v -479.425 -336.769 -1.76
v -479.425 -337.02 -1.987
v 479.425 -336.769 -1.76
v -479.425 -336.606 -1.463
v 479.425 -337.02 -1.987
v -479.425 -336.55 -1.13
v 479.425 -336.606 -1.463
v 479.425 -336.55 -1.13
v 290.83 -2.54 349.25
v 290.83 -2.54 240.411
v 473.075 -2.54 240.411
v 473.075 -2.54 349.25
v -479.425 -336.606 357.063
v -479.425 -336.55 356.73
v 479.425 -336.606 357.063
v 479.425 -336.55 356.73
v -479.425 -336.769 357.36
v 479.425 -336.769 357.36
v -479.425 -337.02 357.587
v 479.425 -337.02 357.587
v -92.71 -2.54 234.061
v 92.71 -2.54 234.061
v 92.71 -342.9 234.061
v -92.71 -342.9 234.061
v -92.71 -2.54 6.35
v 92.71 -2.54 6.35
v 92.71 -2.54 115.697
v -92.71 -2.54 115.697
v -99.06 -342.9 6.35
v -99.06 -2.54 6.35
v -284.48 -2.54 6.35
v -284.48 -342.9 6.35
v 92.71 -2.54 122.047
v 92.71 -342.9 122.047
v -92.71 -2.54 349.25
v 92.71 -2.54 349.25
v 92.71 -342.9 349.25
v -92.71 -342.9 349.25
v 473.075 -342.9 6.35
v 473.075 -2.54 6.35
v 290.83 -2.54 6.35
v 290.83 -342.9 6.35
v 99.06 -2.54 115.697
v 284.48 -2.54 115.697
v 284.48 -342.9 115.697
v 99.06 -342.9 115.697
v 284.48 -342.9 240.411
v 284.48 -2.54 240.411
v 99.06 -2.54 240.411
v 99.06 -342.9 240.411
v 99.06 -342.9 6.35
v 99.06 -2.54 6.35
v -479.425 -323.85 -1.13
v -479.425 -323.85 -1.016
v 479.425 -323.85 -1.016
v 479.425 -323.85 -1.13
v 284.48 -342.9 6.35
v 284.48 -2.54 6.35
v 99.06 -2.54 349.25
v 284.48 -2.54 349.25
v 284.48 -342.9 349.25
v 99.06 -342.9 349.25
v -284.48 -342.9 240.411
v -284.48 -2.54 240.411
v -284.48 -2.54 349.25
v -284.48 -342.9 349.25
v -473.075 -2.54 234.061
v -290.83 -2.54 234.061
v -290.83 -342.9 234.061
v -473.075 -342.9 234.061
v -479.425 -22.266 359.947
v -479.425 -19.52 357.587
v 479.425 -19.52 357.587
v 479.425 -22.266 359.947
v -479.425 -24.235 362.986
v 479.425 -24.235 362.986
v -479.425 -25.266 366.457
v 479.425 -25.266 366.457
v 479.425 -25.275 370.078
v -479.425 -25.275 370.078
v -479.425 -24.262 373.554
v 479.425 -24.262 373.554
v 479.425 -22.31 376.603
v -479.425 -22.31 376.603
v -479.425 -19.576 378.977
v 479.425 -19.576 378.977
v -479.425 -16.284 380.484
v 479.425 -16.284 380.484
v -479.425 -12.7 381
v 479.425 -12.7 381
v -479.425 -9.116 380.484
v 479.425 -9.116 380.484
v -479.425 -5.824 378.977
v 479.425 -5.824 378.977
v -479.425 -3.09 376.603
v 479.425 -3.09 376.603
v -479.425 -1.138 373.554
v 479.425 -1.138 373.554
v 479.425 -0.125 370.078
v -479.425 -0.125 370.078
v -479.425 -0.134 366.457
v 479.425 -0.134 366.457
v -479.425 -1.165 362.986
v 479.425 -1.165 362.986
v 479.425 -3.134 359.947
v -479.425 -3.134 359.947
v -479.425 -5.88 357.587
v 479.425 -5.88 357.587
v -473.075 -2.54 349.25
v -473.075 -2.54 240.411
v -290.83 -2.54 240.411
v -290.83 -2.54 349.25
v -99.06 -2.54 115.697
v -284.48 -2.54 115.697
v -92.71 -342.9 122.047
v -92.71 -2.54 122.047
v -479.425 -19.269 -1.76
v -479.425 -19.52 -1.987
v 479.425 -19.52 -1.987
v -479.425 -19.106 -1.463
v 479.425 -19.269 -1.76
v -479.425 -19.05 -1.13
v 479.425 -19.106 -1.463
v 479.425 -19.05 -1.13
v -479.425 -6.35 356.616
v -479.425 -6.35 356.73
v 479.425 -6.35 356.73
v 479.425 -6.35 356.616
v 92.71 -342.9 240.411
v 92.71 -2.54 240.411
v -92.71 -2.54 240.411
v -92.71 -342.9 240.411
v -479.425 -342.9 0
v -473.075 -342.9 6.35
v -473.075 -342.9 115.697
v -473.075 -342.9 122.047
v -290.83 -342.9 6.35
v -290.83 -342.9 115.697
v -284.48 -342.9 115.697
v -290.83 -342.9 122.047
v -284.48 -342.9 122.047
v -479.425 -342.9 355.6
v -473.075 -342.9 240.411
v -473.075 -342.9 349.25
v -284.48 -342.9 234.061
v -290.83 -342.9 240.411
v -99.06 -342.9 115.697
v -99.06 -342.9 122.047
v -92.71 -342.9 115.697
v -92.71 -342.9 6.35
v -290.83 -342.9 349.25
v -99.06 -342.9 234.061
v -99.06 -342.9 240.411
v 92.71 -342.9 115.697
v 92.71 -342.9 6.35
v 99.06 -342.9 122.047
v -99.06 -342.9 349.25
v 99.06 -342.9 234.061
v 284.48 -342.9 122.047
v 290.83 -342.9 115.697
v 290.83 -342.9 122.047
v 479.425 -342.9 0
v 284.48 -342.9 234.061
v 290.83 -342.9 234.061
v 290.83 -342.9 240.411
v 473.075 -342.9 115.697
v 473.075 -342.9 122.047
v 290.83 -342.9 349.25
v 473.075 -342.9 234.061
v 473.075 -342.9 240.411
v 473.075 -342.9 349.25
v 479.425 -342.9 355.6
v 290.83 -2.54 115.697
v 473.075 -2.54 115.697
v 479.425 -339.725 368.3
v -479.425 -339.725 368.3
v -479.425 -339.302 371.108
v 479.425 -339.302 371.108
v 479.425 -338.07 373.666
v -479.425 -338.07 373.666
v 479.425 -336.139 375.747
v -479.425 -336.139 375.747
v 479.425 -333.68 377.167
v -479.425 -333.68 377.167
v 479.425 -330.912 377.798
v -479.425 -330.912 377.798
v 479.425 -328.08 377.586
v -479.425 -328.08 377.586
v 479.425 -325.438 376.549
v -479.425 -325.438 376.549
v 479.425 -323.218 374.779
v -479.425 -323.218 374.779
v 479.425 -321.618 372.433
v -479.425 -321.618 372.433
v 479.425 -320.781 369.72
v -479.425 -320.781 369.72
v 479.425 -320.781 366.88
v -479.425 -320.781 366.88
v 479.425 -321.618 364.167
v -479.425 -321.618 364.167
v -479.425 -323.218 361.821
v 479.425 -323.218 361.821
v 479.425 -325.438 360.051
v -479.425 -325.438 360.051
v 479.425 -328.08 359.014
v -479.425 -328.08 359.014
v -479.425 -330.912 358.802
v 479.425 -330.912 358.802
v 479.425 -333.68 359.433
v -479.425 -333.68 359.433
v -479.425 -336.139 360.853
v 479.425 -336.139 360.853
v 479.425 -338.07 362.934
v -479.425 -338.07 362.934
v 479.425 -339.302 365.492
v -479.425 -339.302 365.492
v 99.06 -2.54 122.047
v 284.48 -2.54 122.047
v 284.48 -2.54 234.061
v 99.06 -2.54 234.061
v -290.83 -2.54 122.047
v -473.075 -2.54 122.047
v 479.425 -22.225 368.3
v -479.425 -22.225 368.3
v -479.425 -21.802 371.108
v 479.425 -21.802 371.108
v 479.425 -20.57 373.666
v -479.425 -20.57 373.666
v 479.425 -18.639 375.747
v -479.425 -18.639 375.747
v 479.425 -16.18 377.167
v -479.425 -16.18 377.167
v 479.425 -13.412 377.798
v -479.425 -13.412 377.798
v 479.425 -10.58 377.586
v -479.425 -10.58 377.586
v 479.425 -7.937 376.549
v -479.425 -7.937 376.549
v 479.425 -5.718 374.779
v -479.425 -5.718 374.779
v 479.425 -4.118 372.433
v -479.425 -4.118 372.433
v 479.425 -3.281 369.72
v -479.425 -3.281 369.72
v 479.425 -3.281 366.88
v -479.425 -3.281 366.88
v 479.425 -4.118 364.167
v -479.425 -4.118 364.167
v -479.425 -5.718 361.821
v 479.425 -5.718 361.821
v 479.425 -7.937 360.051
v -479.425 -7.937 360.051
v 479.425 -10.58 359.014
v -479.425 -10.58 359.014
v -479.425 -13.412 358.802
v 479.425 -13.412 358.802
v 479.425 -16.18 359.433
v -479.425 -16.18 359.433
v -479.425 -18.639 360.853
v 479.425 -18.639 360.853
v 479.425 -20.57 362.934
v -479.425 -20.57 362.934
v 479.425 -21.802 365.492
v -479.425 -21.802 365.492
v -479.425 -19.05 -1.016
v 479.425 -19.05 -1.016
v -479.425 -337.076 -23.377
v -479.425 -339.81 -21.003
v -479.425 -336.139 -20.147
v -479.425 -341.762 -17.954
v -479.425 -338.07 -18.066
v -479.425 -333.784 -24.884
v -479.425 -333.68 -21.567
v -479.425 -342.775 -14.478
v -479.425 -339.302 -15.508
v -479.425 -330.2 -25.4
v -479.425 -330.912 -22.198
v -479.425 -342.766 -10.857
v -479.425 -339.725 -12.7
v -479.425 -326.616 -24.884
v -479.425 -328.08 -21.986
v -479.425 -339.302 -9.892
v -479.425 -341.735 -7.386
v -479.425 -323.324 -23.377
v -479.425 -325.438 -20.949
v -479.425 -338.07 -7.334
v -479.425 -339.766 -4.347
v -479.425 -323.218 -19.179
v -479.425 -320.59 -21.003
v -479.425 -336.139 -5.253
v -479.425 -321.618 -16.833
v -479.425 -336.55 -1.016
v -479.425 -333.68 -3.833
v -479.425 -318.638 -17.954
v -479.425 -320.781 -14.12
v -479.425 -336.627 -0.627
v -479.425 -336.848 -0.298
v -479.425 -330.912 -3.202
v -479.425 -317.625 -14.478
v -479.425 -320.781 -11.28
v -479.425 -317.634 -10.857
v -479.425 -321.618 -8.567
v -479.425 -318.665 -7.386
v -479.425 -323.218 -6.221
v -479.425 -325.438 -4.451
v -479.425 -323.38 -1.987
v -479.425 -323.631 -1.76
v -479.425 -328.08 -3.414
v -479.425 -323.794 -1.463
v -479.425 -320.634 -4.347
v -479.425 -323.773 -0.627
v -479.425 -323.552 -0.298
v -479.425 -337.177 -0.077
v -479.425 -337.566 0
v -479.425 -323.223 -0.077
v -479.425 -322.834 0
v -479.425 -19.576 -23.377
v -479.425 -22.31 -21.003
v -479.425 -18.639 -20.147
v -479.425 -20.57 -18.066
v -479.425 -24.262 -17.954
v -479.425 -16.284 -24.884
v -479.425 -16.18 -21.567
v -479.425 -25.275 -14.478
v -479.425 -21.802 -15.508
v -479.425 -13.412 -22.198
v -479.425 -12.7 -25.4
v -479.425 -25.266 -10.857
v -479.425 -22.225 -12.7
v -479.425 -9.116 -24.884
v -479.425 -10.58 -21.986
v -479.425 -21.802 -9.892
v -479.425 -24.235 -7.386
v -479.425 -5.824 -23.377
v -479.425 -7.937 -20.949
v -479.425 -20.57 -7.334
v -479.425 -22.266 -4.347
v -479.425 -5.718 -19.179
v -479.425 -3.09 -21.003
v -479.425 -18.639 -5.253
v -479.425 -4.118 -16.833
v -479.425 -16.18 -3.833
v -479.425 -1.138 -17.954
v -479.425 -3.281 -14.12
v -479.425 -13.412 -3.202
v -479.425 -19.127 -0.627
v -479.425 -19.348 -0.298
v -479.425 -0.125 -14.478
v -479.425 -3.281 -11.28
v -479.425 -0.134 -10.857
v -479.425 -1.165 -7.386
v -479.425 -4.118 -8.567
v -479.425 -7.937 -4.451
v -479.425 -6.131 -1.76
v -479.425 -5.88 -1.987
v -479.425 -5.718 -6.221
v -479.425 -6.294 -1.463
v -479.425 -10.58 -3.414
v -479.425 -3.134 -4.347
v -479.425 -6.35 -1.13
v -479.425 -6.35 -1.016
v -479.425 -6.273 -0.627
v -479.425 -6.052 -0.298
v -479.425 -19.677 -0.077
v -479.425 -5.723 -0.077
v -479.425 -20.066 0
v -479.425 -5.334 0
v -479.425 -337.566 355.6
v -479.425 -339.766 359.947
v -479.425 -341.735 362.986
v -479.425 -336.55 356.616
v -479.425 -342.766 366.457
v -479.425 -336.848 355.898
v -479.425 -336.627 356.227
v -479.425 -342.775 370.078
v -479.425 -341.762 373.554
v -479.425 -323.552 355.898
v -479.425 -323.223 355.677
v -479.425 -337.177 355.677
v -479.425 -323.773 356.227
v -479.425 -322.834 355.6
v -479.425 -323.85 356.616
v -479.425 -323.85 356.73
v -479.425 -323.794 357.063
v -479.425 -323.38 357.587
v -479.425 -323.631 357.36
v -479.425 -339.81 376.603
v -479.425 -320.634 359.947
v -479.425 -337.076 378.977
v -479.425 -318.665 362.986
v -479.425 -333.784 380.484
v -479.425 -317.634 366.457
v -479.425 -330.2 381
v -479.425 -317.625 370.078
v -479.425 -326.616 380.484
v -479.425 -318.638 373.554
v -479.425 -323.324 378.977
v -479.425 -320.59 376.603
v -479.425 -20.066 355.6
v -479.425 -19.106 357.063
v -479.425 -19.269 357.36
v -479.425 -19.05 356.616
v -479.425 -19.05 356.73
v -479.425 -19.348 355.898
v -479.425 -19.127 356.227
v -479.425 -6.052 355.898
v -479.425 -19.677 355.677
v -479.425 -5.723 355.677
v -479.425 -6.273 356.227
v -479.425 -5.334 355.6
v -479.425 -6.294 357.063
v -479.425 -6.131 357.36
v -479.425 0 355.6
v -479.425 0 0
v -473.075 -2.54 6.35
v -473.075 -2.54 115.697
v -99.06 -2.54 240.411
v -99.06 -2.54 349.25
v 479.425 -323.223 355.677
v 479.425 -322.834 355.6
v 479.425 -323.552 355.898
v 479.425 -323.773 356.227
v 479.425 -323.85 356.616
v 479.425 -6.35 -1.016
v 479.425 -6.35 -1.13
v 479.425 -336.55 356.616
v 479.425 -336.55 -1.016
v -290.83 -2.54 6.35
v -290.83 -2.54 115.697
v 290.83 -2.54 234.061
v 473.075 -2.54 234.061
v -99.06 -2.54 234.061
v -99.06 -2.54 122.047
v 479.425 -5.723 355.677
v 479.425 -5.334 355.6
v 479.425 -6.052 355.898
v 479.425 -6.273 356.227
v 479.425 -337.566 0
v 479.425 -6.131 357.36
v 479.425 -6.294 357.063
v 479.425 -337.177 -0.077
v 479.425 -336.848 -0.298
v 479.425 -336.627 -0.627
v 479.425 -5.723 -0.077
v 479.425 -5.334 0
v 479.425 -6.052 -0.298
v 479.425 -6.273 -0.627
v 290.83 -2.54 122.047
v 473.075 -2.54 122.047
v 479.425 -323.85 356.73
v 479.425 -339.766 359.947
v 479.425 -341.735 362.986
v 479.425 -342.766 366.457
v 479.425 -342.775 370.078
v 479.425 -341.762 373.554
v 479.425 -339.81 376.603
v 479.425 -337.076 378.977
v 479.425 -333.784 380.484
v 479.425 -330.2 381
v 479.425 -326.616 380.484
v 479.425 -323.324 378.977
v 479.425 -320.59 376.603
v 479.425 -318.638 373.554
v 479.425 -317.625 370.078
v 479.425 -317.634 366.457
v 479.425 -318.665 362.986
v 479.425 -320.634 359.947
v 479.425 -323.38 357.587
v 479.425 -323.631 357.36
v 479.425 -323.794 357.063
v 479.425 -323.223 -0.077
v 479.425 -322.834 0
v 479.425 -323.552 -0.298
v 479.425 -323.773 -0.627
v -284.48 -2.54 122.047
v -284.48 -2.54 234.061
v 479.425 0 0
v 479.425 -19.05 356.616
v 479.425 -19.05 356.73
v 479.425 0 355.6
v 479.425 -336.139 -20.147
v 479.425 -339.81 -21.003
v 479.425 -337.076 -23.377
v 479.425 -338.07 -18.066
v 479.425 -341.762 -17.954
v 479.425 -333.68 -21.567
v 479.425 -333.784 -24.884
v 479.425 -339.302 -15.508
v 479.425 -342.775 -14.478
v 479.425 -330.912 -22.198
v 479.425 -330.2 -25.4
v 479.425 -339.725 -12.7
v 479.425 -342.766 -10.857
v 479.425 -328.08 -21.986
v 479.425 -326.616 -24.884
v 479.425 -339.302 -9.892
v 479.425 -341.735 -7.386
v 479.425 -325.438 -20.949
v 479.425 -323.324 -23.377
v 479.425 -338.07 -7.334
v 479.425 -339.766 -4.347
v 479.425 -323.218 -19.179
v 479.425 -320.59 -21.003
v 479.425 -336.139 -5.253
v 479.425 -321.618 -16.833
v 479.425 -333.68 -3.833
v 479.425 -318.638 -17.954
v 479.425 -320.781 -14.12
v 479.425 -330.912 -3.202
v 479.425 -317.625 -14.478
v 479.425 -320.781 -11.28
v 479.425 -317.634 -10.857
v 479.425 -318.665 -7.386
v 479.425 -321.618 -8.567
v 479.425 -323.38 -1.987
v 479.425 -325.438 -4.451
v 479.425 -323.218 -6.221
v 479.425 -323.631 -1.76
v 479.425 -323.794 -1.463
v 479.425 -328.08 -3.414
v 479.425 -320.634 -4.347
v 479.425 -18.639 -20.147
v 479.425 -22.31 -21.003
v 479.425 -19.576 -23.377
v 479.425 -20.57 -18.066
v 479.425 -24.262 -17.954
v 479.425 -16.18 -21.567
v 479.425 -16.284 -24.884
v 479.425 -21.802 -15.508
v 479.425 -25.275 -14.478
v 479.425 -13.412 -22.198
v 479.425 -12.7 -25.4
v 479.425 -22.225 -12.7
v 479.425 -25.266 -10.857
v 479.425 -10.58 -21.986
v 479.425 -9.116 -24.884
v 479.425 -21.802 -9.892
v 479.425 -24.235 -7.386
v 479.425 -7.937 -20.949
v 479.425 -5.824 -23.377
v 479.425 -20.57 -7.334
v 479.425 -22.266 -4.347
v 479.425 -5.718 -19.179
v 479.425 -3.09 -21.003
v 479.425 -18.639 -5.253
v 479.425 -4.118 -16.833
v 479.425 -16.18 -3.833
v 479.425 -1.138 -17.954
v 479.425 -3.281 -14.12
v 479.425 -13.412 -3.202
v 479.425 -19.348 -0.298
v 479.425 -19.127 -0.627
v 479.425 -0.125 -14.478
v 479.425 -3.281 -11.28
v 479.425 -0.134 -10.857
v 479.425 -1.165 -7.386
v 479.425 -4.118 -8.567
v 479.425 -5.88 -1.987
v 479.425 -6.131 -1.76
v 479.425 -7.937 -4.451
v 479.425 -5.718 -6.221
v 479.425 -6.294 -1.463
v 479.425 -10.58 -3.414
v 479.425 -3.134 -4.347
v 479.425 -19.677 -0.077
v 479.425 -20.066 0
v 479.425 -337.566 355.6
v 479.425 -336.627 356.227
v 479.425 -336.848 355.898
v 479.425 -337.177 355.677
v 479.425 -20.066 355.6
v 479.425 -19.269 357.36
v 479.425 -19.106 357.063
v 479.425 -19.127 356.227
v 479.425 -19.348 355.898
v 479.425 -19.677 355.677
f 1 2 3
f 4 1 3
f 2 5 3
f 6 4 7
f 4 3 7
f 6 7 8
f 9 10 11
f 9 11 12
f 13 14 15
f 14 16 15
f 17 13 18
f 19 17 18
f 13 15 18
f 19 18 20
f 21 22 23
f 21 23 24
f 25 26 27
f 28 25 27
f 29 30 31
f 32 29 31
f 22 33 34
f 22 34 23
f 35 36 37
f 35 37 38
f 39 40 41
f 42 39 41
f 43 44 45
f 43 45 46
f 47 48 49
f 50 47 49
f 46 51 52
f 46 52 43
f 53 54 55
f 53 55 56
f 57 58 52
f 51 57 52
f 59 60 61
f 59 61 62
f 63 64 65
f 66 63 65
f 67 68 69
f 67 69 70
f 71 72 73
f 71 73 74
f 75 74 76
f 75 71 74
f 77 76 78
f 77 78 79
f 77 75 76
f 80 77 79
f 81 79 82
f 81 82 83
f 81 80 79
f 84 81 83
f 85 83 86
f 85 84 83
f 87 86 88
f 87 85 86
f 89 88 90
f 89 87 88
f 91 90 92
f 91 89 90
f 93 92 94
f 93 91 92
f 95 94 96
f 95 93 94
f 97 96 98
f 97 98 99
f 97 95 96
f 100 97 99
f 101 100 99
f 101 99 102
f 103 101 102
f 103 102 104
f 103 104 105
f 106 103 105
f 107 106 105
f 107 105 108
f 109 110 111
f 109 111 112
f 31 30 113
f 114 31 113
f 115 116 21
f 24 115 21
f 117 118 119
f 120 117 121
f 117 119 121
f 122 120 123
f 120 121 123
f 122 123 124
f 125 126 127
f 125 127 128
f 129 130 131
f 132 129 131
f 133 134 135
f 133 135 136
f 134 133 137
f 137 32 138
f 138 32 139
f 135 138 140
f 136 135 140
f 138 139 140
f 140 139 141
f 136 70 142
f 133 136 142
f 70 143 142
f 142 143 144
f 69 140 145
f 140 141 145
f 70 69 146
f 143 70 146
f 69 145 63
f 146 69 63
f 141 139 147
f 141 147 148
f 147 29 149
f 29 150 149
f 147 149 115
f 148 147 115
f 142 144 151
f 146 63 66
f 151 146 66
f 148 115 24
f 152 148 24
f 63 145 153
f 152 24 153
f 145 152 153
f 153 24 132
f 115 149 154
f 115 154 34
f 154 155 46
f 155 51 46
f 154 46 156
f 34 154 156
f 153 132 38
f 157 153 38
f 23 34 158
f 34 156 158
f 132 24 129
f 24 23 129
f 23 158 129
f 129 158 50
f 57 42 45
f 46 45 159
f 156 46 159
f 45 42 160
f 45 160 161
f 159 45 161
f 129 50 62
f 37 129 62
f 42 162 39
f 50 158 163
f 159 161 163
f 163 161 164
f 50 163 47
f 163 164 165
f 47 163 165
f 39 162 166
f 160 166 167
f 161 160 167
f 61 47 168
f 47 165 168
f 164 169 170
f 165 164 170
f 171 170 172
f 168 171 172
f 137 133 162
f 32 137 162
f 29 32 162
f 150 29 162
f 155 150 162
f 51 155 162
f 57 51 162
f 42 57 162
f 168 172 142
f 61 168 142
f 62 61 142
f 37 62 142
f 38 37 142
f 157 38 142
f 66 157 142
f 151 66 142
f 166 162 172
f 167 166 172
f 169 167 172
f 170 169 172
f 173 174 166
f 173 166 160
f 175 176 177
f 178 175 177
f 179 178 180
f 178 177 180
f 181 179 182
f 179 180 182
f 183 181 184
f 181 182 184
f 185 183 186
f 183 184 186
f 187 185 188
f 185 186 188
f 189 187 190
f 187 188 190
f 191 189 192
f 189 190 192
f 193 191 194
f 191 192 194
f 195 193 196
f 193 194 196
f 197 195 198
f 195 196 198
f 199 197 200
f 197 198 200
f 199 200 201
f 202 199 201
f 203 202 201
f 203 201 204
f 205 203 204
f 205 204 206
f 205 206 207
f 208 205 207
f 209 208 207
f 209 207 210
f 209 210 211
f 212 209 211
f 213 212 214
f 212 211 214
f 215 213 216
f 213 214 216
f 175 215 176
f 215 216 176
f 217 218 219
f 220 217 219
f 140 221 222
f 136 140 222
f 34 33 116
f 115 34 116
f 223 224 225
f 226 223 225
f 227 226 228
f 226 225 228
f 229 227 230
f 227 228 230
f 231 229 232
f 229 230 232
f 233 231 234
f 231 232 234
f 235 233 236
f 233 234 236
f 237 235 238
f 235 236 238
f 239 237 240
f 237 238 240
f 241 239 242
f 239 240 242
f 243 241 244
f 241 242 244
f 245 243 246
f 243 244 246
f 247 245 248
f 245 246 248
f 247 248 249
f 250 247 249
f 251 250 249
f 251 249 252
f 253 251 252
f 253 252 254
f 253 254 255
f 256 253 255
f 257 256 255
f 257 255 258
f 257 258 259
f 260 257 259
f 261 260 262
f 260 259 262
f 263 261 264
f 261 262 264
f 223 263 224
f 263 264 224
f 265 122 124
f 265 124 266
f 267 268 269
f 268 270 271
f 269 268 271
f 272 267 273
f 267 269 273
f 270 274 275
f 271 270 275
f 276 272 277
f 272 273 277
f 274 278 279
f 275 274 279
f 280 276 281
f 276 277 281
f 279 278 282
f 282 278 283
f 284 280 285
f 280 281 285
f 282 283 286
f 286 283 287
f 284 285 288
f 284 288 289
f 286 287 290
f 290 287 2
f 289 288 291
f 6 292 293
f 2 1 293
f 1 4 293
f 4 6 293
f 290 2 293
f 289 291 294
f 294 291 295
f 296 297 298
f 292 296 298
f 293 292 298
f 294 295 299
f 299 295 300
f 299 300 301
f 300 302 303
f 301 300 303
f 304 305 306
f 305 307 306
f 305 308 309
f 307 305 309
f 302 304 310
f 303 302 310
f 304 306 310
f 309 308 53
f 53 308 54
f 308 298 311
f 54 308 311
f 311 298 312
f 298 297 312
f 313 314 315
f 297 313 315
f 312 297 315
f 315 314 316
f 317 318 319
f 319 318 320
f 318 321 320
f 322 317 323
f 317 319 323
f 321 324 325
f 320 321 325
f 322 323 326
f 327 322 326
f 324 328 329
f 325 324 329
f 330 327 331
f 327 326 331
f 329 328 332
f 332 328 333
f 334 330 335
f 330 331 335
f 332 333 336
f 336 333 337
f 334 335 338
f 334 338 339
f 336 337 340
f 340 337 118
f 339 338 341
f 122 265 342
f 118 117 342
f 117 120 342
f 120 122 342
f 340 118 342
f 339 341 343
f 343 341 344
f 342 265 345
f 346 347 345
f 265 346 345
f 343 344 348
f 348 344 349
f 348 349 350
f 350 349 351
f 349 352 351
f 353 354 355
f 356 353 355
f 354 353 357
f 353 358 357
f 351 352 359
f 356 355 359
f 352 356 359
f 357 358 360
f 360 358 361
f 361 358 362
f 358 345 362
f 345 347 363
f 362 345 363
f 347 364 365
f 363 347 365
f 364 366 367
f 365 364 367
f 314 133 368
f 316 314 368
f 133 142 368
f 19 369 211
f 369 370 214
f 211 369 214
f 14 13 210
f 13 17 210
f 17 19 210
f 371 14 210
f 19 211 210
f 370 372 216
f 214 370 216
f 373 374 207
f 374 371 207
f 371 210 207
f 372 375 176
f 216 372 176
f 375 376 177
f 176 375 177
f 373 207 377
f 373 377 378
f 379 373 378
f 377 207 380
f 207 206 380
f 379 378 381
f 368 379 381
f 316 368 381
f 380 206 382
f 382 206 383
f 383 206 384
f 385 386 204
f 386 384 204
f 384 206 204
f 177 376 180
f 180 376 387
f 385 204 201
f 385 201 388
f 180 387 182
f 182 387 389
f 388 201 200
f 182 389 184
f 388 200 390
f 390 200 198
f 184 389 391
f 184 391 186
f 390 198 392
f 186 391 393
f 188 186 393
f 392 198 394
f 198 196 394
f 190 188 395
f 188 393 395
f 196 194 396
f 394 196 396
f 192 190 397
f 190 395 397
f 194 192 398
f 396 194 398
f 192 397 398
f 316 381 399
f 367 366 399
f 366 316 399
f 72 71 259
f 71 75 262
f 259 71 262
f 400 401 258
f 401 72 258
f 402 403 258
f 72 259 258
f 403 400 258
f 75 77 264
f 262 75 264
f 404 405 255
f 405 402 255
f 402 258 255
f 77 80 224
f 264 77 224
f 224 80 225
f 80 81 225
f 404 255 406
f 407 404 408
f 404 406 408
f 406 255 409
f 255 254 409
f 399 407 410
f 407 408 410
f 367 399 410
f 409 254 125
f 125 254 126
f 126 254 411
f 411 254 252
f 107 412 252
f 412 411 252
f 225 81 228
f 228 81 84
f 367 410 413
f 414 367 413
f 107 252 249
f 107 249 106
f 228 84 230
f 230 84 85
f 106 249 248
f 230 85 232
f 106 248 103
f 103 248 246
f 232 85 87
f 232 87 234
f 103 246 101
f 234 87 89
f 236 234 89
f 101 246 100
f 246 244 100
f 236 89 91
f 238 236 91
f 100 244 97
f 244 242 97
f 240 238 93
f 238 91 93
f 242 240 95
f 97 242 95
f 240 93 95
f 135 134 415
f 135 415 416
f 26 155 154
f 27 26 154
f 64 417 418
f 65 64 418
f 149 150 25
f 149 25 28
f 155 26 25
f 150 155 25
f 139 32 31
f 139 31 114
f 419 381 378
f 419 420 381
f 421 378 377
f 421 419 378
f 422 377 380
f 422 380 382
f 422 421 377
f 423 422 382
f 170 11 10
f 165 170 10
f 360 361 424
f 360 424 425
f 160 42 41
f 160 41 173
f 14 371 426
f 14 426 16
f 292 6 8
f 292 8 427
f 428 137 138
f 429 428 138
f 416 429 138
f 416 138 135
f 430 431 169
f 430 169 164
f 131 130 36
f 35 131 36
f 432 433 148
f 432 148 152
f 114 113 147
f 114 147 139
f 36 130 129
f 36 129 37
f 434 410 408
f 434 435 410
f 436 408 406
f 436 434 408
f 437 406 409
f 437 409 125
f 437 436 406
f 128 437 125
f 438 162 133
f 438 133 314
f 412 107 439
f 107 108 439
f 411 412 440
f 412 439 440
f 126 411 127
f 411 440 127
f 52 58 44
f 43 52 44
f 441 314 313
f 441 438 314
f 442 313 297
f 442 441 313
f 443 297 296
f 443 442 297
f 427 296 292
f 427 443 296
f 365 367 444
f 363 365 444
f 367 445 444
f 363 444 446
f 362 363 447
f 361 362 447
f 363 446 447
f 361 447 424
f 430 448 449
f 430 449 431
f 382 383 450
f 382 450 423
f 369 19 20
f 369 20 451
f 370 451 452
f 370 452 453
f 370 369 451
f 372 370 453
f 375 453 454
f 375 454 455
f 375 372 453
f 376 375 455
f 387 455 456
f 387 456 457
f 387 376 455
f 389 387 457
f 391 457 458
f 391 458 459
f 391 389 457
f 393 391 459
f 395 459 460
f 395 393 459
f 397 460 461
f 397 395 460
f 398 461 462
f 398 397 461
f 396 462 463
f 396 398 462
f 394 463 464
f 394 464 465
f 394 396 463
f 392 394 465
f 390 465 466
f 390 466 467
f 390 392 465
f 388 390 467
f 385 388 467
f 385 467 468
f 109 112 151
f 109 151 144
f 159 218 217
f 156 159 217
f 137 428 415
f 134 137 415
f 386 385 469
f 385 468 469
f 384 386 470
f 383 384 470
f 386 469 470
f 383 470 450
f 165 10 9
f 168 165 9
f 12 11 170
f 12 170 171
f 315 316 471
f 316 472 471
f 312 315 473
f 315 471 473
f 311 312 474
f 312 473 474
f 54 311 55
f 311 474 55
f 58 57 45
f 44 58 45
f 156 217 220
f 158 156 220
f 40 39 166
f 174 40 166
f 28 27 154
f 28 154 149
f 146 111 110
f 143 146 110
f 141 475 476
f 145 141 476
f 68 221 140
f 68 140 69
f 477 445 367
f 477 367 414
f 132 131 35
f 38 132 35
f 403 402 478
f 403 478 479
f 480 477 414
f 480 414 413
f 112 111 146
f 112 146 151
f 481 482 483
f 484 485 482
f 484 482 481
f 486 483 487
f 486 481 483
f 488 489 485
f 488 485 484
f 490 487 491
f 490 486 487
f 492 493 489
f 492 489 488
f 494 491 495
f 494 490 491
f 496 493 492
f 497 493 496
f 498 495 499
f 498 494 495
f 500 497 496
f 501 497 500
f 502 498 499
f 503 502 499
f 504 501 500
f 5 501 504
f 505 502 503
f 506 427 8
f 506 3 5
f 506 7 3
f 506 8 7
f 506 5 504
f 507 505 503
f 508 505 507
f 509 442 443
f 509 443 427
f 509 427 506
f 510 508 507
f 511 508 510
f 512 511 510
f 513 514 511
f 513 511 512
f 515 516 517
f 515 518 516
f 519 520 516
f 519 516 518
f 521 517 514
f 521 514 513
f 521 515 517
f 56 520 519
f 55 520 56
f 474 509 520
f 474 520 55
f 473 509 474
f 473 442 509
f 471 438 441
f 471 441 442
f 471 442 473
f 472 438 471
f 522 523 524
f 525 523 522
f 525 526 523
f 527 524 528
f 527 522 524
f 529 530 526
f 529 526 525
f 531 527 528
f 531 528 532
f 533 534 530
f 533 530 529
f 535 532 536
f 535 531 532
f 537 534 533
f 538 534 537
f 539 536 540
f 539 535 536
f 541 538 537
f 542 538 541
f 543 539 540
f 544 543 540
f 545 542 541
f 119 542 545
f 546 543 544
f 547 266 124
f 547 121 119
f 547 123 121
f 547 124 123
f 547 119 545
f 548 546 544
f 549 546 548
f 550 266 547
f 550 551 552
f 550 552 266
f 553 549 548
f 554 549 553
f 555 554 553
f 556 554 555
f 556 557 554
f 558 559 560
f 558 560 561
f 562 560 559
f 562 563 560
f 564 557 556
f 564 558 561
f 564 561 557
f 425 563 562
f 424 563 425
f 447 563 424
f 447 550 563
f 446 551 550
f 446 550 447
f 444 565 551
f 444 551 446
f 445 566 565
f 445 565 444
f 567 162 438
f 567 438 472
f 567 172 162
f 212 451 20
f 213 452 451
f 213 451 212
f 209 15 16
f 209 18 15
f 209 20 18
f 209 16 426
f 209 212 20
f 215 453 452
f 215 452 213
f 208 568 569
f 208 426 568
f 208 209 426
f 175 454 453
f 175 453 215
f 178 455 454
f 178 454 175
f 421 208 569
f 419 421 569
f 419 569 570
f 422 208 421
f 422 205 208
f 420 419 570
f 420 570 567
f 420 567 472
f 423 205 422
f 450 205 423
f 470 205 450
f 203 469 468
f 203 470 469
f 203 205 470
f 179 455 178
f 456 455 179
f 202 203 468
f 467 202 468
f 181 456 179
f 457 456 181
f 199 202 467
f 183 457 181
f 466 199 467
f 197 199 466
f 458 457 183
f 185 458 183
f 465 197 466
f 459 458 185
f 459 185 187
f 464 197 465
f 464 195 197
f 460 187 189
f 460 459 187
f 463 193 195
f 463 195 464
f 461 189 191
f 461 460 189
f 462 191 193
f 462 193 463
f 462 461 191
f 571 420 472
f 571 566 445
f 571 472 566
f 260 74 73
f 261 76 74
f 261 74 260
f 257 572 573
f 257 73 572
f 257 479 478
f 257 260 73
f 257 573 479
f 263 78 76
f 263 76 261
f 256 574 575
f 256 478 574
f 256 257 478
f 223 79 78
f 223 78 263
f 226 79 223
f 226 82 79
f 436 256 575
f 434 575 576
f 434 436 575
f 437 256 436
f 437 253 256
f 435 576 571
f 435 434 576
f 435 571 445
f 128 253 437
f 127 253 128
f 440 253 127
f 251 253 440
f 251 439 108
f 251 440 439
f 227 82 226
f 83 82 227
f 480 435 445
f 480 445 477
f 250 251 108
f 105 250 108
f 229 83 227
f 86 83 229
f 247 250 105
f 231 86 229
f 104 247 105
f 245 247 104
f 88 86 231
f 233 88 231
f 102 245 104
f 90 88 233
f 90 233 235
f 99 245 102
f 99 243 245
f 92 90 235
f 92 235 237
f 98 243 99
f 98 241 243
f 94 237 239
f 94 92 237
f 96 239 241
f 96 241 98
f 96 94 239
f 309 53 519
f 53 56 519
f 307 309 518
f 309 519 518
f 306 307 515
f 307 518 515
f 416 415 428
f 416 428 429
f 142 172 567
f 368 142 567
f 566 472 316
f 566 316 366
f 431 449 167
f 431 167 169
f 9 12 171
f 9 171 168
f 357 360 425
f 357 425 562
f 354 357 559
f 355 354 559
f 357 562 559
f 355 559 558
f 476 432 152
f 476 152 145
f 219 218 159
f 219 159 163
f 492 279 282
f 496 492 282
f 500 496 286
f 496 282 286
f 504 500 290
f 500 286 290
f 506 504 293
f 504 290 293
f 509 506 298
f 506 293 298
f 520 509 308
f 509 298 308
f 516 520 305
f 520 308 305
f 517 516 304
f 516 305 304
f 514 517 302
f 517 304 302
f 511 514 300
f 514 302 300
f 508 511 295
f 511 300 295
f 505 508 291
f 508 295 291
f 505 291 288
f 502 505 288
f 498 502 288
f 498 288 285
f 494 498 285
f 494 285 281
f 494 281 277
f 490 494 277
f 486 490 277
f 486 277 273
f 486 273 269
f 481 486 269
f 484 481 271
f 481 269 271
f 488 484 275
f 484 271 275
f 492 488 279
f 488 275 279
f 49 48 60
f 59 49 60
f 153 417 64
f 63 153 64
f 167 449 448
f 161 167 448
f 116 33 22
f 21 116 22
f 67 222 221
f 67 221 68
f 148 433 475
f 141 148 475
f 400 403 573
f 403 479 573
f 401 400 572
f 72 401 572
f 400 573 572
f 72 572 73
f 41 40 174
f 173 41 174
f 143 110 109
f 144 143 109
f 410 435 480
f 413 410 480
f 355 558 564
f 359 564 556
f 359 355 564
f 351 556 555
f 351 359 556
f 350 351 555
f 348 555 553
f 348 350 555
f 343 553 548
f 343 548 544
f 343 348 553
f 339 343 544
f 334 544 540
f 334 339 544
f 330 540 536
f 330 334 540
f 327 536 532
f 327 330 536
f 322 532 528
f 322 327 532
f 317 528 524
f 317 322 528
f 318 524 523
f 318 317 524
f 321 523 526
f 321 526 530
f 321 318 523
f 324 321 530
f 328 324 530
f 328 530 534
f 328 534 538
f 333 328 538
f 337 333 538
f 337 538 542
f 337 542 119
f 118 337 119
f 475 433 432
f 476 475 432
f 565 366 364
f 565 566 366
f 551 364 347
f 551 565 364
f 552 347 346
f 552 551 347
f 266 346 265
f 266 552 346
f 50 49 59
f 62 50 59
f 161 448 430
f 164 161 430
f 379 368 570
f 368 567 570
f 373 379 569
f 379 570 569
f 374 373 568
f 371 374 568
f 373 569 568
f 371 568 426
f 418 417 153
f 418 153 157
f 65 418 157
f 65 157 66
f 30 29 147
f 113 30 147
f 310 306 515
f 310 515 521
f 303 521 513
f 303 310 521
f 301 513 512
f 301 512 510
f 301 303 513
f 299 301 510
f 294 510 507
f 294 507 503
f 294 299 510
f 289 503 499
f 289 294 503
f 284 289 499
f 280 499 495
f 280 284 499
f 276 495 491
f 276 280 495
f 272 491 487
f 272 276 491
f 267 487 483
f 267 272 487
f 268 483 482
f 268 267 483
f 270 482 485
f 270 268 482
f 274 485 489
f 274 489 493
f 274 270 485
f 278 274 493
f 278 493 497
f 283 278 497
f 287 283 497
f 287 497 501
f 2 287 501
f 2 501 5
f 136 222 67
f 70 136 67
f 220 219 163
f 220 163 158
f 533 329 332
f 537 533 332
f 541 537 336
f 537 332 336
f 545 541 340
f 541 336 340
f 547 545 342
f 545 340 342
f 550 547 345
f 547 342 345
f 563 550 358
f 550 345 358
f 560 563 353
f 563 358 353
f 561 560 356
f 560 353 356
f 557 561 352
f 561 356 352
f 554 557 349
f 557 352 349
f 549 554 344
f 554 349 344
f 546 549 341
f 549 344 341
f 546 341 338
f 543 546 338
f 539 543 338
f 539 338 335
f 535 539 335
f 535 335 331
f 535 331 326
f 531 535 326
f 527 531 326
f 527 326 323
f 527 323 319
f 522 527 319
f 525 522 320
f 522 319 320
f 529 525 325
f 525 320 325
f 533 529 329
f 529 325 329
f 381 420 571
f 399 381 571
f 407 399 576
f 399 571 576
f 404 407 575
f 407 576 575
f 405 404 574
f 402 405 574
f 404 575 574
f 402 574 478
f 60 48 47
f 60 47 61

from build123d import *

# Parameters (mm, degrees)
F0_W     = 342.9
F0_H     = 355.6
F1_DEPTH = 479.425
F2_T     = -2.54
F3_R     = 9.525
F4_DEPTH = 958.85
F5_W     = 958.85
F5_H     = 355.6
F5_W_2   = 182.245
F5_H_2   = 109.347
F5_W_3   = 185.42
F5_H_3   = 112.014
F5_H_4   = 108.839
F6_DEPTH = 342.9
F7_R     = 1.016


with BuildPart() as f1:
    # F0 (on Right) → F1 (new body, symmetric)
    with BuildSketch(Plane.YZ):
        with Locations((-171.45, 177.8)):
            Rectangle(F0_W, F0_H)
    extrude(amount=F1_DEPTH, both=True)

    # F2
    f2_openings = [f1.faces().sort_by_distance(p)[0] for p in [
        (0, -342.9, 177.8),
    ]]
    offset(amount=F2_T, openings=f2_openings)

    # F3 (on face) → F4 (join, through all)
    with BuildSketch(Plane(origin=(-479.425, 0, 0), x_dir=(0, -1, 0), z_dir=(-1, 0, 0))):
        with BuildLine():
            Line((19.05, 355.6), (19.05, 357.3014773719))
            ThreePointArc((19.05, 357.3014773719), (12.7, 381), (6.35, 357.3014773719))
            Line((6.35, 357.3014773719), (6.35, 355.6))
            Line((6.35, 355.6), (19.05, 355.6))
        make_face()
        with Locations((12.7, 368.3)):
            Circle(F3_R, mode=Mode.SUBTRACT)
        with BuildLine():
            Line((336.55, 355.6), (336.55, 357.3014773719))
            ThreePointArc((336.55, 357.3014773719), (330.2, 381), (323.85, 357.3014773719))
            Line((323.85, 357.3014773719), (323.85, 355.6))
            Line((323.85, 355.6), (336.55, 355.6))
        make_face()
        with Locations((330.2, 368.3)):
            Circle(F3_R, mode=Mode.SUBTRACT)
        with BuildLine():
            Line((6.35, 0), (6.35, -1.7014773719))
            ThreePointArc((6.35, -1.7014773719), (12.7, -25.4), (19.05, -1.7014773719))
            Line((19.05, -1.7014773719), (19.05, 0))
            Line((19.05, 0), (6.35, 0))
        make_face()
        with Locations((12.7, -12.7)):
            Circle(F3_R, mode=Mode.SUBTRACT)
        with BuildLine():
            Line((323.85, 0), (323.85, -1.7014773719))
            ThreePointArc((323.85, -1.7014773719), (330.2, -25.4), (336.55, -1.7014773719))
            Line((336.55, -1.7014773719), (336.55, 0))
            Line((336.55, 0), (323.85, 0))
        make_face()
        with Locations((330.2, -12.7)):
            Circle(F3_R, mode=Mode.SUBTRACT)
    extrude(amount=-F4_DEPTH)

    # F5 (on face) → F6 (join, through all)
    with BuildSketch(Plane(origin=(0, 0, 0), x_dir=(-1, 0, 0), z_dir=(0, 1, 0))):
        with Locations((0, 177.8)):
            Rectangle(F5_W, F5_H)
        with Locations((-381.9525, 61.0235)):
            Rectangle(F5_W_2, F5_H_2, mode=Mode.SUBTRACT)
        with Locations((-191.77, 61.0235)):
            Rectangle(F5_W_3, F5_H_2, mode=Mode.SUBTRACT)
        with Locations((0, 61.0235)):
            Rectangle(F5_W_3, F5_H_2, mode=Mode.SUBTRACT)
        with Locations((191.77, 61.0235)):
            Rectangle(F5_W_3, F5_H_2, mode=Mode.SUBTRACT)
        with Locations((381.9525, 61.0235)):
            Rectangle(F5_W_2, F5_H_2, mode=Mode.SUBTRACT)
        with Locations((-381.9525, 178.054)):
            Rectangle(F5_W_2, F5_H_3, mode=Mode.SUBTRACT)
        with Locations((-191.77, 178.054)):
            Rectangle(F5_W_3, F5_H_3, mode=Mode.SUBTRACT)
        with Locations((0, 178.054)):
            Rectangle(F5_W_3, F5_H_3, mode=Mode.SUBTRACT)
        with Locations((-381.9525, 294.8305)):
            Rectangle(F5_W_2, F5_H_4, mode=Mode.SUBTRACT)
        with Locations((-191.77, 294.8305)):
            Rectangle(F5_W_3, F5_H_4, mode=Mode.SUBTRACT)
        with Locations((0, 294.8305)):
            Rectangle(F5_W_3, F5_H_4, mode=Mode.SUBTRACT)
        with Locations((191.77, 178.054)):
            Rectangle(F5_W_3, F5_H_3, mode=Mode.SUBTRACT)
        with Locations((381.9525, 178.054)):
            Rectangle(F5_W_2, F5_H_3, mode=Mode.SUBTRACT)
        with Locations((191.77, 294.8305)):
            Rectangle(F5_W_3, F5_H_4, mode=Mode.SUBTRACT)
        with Locations((381.9525, 294.8305)):
            Rectangle(F5_W_2, F5_H_4, mode=Mode.SUBTRACT)
    extrude(amount=-F6_DEPTH)

    # F7
    f7_edges = [f1.edges().sort_by_distance(p)[0] for p in [
        (0, -336.55, 357.301477),
        (0, -336.55, 355.6),
        (0, -323.85, 357.301477),
        (0, -323.85, 355.6),
        (0, -19.05, 355.6),
        (0, -19.05, 357.301477),
        (0, -6.35, 357.301477),
        (0, -6.35, 355.6),
        (0, -6.35, 0),
        (0, -6.35, -1.701477),
        (0, -19.05, 0),
        (0, -19.05, -1.701477),
        (0, -323.85, -1.701477),
        (0, -323.85, 0),
        (0, -336.55, 0),
        (0, -336.55, -1.701477),
    ]]
    fillet(f7_edges, radius=F7_R)


solid = f1.part
